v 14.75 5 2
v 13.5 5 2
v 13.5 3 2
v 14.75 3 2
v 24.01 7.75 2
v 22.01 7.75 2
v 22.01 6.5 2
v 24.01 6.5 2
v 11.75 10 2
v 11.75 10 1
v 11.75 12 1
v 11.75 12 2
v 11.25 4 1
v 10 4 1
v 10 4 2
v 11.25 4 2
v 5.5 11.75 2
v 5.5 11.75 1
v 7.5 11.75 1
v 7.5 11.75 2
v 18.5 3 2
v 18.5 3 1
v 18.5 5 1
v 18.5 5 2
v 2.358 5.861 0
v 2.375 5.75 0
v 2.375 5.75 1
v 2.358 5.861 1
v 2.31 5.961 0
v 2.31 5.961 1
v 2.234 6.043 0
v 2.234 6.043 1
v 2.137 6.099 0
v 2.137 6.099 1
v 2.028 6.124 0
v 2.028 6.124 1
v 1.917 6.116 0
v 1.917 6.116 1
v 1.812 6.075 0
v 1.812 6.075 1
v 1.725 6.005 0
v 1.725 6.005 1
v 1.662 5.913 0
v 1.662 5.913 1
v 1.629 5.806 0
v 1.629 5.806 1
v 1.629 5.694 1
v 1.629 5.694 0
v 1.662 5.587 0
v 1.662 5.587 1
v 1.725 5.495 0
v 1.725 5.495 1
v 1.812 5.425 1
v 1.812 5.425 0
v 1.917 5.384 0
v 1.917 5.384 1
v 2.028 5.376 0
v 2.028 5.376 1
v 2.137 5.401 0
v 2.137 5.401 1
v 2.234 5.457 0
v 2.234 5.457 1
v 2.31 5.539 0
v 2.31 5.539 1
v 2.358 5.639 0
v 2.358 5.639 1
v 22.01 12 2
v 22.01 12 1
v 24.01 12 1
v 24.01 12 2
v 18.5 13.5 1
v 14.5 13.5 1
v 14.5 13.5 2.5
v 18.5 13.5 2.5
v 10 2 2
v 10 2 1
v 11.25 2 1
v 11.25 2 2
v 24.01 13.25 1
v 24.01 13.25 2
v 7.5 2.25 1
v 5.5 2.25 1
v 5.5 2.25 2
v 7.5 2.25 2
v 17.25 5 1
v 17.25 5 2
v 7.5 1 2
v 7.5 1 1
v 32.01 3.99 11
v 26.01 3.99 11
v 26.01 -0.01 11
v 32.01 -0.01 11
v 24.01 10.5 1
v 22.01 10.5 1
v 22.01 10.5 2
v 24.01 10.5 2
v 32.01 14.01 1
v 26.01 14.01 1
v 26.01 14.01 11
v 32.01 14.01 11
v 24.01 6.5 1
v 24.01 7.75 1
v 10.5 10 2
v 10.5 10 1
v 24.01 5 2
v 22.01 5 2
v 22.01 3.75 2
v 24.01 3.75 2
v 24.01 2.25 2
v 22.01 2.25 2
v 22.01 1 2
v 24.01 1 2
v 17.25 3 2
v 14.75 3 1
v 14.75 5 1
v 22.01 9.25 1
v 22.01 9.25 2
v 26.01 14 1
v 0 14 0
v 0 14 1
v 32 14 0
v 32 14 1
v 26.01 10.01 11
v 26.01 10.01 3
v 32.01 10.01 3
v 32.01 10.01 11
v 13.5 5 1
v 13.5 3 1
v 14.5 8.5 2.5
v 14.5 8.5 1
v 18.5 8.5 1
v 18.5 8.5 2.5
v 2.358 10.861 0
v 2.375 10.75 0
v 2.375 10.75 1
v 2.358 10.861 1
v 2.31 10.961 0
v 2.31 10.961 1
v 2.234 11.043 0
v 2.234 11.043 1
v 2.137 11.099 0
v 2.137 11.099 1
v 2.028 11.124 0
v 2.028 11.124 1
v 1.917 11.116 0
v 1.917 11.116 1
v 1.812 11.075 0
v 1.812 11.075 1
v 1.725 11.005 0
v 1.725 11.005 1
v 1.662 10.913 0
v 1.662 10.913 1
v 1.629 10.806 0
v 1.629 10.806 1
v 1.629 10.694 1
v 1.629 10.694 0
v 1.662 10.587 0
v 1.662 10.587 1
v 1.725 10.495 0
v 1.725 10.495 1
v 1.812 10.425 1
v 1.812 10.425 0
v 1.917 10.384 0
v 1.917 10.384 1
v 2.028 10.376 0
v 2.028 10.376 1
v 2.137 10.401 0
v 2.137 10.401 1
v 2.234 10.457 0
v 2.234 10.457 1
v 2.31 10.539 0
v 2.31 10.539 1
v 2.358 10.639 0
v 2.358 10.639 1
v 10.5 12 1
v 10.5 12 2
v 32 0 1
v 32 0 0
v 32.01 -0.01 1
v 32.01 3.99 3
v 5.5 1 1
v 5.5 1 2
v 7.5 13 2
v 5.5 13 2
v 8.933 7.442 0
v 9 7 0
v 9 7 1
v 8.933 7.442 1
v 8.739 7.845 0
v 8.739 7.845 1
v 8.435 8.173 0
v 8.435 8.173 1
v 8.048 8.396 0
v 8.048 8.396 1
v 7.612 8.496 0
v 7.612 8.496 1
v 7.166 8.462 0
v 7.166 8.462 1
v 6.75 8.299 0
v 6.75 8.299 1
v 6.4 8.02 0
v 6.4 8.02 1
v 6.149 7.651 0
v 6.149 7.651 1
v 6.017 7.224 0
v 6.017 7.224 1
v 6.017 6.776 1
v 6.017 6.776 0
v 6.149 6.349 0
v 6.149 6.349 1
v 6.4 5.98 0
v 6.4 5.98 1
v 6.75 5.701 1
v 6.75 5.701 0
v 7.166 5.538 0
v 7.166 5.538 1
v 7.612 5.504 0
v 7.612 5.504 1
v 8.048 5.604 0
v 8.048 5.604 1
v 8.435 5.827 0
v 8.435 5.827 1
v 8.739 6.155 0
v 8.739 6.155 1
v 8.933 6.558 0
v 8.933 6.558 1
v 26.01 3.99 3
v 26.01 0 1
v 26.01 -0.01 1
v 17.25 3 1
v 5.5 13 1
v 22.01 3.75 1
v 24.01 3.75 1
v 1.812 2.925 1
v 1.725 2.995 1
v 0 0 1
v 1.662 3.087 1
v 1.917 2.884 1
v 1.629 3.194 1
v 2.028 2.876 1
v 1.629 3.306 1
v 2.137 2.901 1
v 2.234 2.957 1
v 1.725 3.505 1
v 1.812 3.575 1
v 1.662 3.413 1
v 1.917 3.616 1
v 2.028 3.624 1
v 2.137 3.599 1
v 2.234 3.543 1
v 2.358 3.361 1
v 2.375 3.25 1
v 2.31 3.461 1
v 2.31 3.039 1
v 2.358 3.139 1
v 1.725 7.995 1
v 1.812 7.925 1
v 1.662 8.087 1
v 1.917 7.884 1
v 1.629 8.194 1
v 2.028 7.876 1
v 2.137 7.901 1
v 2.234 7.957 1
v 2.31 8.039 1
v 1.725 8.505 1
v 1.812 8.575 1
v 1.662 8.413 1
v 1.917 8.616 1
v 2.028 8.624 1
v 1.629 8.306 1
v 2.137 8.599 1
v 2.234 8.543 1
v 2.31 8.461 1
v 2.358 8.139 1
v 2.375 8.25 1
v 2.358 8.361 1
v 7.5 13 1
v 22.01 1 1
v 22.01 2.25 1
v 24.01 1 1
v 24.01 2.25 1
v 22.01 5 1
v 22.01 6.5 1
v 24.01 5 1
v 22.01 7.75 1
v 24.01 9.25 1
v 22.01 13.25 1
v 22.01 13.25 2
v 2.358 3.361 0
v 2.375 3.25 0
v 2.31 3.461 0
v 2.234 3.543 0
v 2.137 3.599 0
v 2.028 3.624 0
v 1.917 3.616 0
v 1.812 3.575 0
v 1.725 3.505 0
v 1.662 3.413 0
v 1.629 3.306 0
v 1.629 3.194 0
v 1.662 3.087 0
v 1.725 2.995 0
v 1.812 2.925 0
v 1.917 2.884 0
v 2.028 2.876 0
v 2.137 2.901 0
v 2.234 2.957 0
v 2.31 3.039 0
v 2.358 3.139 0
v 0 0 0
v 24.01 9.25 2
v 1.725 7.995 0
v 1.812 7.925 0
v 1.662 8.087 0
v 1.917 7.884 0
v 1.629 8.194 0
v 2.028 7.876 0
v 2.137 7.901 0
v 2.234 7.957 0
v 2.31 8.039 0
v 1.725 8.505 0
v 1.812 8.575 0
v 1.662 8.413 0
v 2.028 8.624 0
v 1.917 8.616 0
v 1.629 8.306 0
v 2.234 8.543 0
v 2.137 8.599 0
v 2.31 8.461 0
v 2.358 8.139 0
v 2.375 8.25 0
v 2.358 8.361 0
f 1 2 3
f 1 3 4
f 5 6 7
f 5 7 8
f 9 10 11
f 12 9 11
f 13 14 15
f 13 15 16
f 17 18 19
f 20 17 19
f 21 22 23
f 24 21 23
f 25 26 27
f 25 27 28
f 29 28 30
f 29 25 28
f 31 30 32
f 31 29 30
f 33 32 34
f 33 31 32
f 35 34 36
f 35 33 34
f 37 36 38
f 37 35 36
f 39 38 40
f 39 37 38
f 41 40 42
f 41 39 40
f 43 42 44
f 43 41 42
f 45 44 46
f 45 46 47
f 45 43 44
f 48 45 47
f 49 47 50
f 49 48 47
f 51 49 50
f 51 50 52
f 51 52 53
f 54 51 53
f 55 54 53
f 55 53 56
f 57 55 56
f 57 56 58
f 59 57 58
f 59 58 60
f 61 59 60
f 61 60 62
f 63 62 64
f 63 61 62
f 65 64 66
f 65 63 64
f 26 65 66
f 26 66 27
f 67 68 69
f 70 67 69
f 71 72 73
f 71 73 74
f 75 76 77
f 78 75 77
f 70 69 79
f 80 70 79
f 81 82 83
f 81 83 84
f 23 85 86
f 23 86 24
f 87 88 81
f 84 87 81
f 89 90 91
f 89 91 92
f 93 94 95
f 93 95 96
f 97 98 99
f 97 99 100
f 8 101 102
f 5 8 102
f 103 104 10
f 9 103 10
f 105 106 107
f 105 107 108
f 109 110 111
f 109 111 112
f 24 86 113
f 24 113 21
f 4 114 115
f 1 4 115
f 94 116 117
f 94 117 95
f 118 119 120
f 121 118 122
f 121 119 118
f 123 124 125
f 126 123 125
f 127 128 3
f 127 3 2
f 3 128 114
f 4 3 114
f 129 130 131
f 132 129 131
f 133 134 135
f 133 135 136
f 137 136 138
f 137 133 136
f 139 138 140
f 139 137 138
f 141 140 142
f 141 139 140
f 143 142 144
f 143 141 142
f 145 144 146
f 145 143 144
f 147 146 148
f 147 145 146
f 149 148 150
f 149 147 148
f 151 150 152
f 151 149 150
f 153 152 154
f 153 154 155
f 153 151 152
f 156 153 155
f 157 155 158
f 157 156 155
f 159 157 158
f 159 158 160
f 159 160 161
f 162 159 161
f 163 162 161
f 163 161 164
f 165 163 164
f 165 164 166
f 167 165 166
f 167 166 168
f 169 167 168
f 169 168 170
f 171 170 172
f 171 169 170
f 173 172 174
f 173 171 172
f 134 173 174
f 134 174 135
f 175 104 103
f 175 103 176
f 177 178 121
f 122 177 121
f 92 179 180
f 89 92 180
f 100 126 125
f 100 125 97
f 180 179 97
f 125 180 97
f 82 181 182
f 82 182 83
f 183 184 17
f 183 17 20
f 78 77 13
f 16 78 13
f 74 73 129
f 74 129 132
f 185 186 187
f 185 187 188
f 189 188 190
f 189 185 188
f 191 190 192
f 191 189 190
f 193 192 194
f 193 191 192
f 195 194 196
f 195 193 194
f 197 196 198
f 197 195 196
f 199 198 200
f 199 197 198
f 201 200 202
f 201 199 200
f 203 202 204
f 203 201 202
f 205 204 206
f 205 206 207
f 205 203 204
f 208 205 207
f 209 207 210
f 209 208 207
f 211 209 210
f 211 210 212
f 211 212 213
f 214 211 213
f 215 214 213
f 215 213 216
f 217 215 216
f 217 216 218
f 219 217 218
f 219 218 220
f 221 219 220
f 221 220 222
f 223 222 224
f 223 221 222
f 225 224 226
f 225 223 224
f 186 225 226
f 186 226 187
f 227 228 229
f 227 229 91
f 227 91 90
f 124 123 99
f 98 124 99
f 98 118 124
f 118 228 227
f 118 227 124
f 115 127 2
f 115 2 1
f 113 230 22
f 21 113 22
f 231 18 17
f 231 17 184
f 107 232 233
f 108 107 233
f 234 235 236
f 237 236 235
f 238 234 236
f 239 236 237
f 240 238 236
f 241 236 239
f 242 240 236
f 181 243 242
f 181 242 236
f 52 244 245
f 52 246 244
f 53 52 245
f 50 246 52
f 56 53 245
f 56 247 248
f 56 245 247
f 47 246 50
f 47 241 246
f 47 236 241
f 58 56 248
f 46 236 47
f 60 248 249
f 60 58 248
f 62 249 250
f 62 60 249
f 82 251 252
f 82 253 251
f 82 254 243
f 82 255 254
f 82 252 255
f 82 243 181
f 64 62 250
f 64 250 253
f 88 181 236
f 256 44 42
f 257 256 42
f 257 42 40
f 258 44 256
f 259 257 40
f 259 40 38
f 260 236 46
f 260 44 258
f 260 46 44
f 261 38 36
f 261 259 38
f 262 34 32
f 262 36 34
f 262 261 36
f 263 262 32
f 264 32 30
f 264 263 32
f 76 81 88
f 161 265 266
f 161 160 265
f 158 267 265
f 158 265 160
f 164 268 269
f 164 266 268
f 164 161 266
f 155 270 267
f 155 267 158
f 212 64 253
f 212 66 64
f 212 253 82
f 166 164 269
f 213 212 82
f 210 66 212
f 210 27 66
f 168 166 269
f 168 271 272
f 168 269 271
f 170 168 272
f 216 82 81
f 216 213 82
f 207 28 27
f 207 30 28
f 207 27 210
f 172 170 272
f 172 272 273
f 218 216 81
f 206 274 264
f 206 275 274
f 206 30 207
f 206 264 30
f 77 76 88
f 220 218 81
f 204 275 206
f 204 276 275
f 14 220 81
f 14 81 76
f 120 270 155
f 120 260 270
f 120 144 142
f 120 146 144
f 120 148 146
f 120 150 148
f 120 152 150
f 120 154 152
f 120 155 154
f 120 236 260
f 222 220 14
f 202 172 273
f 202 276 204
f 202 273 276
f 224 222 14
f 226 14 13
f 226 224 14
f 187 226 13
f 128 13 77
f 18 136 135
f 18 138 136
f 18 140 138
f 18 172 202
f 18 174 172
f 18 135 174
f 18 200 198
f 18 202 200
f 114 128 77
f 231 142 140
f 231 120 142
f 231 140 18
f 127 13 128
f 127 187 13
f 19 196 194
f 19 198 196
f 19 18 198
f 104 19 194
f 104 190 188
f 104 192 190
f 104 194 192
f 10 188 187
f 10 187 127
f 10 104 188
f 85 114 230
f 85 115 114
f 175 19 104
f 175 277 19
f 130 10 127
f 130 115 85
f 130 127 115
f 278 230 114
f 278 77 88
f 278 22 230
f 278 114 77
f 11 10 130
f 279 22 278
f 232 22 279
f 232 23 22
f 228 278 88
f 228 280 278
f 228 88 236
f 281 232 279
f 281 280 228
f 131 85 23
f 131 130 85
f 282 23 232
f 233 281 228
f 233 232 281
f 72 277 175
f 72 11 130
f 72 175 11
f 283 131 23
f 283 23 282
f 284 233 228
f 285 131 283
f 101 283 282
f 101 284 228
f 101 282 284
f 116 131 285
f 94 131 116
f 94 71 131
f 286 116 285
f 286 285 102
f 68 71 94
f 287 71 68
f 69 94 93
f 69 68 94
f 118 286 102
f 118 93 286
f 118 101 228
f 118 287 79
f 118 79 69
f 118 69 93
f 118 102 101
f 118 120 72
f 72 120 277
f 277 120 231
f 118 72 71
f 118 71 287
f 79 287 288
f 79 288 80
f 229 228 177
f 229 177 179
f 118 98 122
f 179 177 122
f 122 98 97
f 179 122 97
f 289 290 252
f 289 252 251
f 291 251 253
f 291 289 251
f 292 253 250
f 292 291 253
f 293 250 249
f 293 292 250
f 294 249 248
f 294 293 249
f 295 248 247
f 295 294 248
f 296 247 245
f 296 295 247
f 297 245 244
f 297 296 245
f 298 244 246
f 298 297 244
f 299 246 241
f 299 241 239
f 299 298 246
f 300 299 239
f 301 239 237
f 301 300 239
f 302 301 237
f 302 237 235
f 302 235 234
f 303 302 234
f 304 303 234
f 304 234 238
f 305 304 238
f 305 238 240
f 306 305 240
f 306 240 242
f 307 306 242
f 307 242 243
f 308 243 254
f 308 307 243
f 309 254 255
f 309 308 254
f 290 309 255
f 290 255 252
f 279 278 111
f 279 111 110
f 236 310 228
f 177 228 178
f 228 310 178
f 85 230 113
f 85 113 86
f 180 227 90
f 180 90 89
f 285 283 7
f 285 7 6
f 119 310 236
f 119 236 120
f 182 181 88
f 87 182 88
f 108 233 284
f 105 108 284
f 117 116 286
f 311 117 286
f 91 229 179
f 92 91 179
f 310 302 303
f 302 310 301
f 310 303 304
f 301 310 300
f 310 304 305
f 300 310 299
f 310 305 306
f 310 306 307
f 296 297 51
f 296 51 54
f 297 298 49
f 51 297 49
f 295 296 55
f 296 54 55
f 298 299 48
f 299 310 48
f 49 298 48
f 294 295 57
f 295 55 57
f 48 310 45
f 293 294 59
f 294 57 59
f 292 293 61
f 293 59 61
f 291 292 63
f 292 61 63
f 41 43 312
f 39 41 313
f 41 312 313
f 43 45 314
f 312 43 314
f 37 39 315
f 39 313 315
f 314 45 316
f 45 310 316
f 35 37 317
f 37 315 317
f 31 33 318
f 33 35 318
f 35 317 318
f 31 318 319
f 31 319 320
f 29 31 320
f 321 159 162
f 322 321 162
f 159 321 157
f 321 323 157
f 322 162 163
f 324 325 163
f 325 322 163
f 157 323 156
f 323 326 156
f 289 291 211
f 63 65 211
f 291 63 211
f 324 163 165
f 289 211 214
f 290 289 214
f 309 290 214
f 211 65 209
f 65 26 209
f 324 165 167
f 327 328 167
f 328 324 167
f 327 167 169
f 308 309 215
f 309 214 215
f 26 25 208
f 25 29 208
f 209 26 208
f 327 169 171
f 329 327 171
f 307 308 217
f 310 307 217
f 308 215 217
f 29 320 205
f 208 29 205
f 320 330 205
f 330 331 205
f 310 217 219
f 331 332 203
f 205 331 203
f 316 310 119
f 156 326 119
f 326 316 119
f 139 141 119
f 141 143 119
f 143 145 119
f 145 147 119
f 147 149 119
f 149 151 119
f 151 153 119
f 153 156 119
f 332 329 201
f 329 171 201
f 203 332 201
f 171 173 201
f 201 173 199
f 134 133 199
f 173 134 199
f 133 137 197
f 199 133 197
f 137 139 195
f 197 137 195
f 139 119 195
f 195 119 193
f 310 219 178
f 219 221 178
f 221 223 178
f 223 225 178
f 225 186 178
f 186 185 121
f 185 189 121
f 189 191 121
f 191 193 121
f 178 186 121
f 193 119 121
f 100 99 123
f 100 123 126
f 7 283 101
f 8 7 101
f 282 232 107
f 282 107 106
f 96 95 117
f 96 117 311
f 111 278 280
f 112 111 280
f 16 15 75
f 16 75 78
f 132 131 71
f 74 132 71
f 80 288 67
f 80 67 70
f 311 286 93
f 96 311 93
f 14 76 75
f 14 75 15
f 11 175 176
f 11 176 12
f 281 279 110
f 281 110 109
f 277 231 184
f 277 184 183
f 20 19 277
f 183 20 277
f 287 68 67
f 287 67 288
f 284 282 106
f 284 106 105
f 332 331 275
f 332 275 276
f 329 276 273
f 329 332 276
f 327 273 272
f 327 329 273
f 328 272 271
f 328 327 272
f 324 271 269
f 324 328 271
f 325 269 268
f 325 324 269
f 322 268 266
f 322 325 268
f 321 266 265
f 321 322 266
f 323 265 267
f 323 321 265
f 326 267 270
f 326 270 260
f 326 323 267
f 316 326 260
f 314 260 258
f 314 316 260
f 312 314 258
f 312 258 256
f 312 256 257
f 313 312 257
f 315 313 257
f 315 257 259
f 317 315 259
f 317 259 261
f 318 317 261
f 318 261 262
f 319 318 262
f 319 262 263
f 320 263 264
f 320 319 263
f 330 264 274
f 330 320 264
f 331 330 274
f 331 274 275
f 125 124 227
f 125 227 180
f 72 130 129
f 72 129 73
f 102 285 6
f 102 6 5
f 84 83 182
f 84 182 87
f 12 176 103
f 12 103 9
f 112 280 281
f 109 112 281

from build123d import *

# Parameters (mm, degrees)
ESQUISSE1_W        = 32
ESQUISSE1_H        = 14
ESQUISSE1_R        = 0.375
ESQUISSE1_R_2      = 1.5
BOSS_EXTRU_1_DEPTH = 1
ESQUISSE2_W        = 6
ESQUISSE2_H        = 14.02
BOSS_EXTRU_2_DEPTH = 2
ESQUISSE3_W        = 6
ESQUISSE3_H        = 4
BOSS_EXTRU_3_DEPTH = 8
ESQUISSE4_W        = 4
ESQUISSE4_H        = 5
BOSS_EXTRU_4_DEPTH = 1.5
ESQUISSE5_W        = 1.25
ESQUISSE5_H        = 2
ESQUISSE5_W_2      = 2
ESQUISSE5_H_2      = 1.25
BOSS_EXTRU_5_DEPTH = 1


with BuildPart() as part:
    # Esquisse1 → Boss.-Extru.1 (new body)
    with BuildSketch(Plane.XY):
        with Locations((16, 7)):
            Rectangle(ESQUISSE1_W, ESQUISSE1_H)
        with Locations((2, 8.25)):
            Circle(ESQUISSE1_R, mode=Mode.SUBTRACT)
        with Locations((2, 10.75)):
            Circle(ESQUISSE1_R, mode=Mode.SUBTRACT)
        with Locations((2, 5.75)):
            Circle(ESQUISSE1_R, mode=Mode.SUBTRACT)
        with Locations((2, 3.25)):
            Circle(ESQUISSE1_R, mode=Mode.SUBTRACT)
        with Locations((7.5, 7)):
            Circle(ESQUISSE1_R_2, mode=Mode.SUBTRACT)
    extrude(amount=BOSS_EXTRU_1_DEPTH)

    # Esquisse2 → Boss.-Extru.2 (add)
    with BuildSketch(Plane.XY.offset(1)):
        with Locations((29.01, 7)):
            Rectangle(ESQUISSE2_W, ESQUISSE2_H)
    extrude(amount=BOSS_EXTRU_2_DEPTH)

    # Esquisse3 → Boss.-Extru.3 (add)
    with BuildSketch(Plane.XY.offset(3)):
        with Locations((29.01, 12.01)):
            Rectangle(ESQUISSE3_W, ESQUISSE3_H)
        with Locations((29.01, 1.99)):
            Rectangle(ESQUISSE3_W, ESQUISSE3_H)
    extrude(amount=BOSS_EXTRU_3_DEPTH)

    # Esquisse4 → Boss.-Extru.4 (add)
    with BuildSketch(Plane.XY.offset(1)):
        with Locations((16.5, 11)):
            Rectangle(ESQUISSE4_W, ESQUISSE4_H)
    extrude(amount=BOSS_EXTRU_4_DEPTH)

    # Esquisse5 → Boss.-Extru.5 (add)
    with BuildSketch(Plane.XY.offset(1)):
        with Locations((11.125, 11)):
            Rectangle(ESQUISSE5_W, ESQUISSE5_H)
        with Locations((10.625, 3)):
            Rectangle(ESQUISSE5_W, ESQUISSE5_H)
        with Locations((14.125, 4)):
            Rectangle(ESQUISSE5_W, ESQUISSE5_H)
        with Locations((17.875, 4)):
            Rectangle(ESQUISSE5_W, ESQUISSE5_H)
        with Locations((23.01, 12.625)):
            Rectangle(ESQUISSE5_W_2, ESQUISSE5_H_2)
        with Locations((23.01, 9.875)):
            Rectangle(ESQUISSE5_W_2, ESQUISSE5_H_2)
        with Locations((23.01, 7.125)):
            Rectangle(ESQUISSE5_W_2, ESQUISSE5_H_2)
        with Locations((23.01, 4.375)):
            Rectangle(ESQUISSE5_W_2, ESQUISSE5_H_2)
        with Locations((23.01, 1.625)):
            Rectangle(ESQUISSE5_W_2, ESQUISSE5_H_2)
        with Locations((6.5, 12.375)):
            Rectangle(ESQUISSE5_W_2, ESQUISSE5_H_2)
        with Locations((6.5, 1.625)):
            Rectangle(ESQUISSE5_W_2, ESQUISSE5_H_2)
    extrude(amount=BOSS_EXTRU_5_DEPTH)


solid = part.part
